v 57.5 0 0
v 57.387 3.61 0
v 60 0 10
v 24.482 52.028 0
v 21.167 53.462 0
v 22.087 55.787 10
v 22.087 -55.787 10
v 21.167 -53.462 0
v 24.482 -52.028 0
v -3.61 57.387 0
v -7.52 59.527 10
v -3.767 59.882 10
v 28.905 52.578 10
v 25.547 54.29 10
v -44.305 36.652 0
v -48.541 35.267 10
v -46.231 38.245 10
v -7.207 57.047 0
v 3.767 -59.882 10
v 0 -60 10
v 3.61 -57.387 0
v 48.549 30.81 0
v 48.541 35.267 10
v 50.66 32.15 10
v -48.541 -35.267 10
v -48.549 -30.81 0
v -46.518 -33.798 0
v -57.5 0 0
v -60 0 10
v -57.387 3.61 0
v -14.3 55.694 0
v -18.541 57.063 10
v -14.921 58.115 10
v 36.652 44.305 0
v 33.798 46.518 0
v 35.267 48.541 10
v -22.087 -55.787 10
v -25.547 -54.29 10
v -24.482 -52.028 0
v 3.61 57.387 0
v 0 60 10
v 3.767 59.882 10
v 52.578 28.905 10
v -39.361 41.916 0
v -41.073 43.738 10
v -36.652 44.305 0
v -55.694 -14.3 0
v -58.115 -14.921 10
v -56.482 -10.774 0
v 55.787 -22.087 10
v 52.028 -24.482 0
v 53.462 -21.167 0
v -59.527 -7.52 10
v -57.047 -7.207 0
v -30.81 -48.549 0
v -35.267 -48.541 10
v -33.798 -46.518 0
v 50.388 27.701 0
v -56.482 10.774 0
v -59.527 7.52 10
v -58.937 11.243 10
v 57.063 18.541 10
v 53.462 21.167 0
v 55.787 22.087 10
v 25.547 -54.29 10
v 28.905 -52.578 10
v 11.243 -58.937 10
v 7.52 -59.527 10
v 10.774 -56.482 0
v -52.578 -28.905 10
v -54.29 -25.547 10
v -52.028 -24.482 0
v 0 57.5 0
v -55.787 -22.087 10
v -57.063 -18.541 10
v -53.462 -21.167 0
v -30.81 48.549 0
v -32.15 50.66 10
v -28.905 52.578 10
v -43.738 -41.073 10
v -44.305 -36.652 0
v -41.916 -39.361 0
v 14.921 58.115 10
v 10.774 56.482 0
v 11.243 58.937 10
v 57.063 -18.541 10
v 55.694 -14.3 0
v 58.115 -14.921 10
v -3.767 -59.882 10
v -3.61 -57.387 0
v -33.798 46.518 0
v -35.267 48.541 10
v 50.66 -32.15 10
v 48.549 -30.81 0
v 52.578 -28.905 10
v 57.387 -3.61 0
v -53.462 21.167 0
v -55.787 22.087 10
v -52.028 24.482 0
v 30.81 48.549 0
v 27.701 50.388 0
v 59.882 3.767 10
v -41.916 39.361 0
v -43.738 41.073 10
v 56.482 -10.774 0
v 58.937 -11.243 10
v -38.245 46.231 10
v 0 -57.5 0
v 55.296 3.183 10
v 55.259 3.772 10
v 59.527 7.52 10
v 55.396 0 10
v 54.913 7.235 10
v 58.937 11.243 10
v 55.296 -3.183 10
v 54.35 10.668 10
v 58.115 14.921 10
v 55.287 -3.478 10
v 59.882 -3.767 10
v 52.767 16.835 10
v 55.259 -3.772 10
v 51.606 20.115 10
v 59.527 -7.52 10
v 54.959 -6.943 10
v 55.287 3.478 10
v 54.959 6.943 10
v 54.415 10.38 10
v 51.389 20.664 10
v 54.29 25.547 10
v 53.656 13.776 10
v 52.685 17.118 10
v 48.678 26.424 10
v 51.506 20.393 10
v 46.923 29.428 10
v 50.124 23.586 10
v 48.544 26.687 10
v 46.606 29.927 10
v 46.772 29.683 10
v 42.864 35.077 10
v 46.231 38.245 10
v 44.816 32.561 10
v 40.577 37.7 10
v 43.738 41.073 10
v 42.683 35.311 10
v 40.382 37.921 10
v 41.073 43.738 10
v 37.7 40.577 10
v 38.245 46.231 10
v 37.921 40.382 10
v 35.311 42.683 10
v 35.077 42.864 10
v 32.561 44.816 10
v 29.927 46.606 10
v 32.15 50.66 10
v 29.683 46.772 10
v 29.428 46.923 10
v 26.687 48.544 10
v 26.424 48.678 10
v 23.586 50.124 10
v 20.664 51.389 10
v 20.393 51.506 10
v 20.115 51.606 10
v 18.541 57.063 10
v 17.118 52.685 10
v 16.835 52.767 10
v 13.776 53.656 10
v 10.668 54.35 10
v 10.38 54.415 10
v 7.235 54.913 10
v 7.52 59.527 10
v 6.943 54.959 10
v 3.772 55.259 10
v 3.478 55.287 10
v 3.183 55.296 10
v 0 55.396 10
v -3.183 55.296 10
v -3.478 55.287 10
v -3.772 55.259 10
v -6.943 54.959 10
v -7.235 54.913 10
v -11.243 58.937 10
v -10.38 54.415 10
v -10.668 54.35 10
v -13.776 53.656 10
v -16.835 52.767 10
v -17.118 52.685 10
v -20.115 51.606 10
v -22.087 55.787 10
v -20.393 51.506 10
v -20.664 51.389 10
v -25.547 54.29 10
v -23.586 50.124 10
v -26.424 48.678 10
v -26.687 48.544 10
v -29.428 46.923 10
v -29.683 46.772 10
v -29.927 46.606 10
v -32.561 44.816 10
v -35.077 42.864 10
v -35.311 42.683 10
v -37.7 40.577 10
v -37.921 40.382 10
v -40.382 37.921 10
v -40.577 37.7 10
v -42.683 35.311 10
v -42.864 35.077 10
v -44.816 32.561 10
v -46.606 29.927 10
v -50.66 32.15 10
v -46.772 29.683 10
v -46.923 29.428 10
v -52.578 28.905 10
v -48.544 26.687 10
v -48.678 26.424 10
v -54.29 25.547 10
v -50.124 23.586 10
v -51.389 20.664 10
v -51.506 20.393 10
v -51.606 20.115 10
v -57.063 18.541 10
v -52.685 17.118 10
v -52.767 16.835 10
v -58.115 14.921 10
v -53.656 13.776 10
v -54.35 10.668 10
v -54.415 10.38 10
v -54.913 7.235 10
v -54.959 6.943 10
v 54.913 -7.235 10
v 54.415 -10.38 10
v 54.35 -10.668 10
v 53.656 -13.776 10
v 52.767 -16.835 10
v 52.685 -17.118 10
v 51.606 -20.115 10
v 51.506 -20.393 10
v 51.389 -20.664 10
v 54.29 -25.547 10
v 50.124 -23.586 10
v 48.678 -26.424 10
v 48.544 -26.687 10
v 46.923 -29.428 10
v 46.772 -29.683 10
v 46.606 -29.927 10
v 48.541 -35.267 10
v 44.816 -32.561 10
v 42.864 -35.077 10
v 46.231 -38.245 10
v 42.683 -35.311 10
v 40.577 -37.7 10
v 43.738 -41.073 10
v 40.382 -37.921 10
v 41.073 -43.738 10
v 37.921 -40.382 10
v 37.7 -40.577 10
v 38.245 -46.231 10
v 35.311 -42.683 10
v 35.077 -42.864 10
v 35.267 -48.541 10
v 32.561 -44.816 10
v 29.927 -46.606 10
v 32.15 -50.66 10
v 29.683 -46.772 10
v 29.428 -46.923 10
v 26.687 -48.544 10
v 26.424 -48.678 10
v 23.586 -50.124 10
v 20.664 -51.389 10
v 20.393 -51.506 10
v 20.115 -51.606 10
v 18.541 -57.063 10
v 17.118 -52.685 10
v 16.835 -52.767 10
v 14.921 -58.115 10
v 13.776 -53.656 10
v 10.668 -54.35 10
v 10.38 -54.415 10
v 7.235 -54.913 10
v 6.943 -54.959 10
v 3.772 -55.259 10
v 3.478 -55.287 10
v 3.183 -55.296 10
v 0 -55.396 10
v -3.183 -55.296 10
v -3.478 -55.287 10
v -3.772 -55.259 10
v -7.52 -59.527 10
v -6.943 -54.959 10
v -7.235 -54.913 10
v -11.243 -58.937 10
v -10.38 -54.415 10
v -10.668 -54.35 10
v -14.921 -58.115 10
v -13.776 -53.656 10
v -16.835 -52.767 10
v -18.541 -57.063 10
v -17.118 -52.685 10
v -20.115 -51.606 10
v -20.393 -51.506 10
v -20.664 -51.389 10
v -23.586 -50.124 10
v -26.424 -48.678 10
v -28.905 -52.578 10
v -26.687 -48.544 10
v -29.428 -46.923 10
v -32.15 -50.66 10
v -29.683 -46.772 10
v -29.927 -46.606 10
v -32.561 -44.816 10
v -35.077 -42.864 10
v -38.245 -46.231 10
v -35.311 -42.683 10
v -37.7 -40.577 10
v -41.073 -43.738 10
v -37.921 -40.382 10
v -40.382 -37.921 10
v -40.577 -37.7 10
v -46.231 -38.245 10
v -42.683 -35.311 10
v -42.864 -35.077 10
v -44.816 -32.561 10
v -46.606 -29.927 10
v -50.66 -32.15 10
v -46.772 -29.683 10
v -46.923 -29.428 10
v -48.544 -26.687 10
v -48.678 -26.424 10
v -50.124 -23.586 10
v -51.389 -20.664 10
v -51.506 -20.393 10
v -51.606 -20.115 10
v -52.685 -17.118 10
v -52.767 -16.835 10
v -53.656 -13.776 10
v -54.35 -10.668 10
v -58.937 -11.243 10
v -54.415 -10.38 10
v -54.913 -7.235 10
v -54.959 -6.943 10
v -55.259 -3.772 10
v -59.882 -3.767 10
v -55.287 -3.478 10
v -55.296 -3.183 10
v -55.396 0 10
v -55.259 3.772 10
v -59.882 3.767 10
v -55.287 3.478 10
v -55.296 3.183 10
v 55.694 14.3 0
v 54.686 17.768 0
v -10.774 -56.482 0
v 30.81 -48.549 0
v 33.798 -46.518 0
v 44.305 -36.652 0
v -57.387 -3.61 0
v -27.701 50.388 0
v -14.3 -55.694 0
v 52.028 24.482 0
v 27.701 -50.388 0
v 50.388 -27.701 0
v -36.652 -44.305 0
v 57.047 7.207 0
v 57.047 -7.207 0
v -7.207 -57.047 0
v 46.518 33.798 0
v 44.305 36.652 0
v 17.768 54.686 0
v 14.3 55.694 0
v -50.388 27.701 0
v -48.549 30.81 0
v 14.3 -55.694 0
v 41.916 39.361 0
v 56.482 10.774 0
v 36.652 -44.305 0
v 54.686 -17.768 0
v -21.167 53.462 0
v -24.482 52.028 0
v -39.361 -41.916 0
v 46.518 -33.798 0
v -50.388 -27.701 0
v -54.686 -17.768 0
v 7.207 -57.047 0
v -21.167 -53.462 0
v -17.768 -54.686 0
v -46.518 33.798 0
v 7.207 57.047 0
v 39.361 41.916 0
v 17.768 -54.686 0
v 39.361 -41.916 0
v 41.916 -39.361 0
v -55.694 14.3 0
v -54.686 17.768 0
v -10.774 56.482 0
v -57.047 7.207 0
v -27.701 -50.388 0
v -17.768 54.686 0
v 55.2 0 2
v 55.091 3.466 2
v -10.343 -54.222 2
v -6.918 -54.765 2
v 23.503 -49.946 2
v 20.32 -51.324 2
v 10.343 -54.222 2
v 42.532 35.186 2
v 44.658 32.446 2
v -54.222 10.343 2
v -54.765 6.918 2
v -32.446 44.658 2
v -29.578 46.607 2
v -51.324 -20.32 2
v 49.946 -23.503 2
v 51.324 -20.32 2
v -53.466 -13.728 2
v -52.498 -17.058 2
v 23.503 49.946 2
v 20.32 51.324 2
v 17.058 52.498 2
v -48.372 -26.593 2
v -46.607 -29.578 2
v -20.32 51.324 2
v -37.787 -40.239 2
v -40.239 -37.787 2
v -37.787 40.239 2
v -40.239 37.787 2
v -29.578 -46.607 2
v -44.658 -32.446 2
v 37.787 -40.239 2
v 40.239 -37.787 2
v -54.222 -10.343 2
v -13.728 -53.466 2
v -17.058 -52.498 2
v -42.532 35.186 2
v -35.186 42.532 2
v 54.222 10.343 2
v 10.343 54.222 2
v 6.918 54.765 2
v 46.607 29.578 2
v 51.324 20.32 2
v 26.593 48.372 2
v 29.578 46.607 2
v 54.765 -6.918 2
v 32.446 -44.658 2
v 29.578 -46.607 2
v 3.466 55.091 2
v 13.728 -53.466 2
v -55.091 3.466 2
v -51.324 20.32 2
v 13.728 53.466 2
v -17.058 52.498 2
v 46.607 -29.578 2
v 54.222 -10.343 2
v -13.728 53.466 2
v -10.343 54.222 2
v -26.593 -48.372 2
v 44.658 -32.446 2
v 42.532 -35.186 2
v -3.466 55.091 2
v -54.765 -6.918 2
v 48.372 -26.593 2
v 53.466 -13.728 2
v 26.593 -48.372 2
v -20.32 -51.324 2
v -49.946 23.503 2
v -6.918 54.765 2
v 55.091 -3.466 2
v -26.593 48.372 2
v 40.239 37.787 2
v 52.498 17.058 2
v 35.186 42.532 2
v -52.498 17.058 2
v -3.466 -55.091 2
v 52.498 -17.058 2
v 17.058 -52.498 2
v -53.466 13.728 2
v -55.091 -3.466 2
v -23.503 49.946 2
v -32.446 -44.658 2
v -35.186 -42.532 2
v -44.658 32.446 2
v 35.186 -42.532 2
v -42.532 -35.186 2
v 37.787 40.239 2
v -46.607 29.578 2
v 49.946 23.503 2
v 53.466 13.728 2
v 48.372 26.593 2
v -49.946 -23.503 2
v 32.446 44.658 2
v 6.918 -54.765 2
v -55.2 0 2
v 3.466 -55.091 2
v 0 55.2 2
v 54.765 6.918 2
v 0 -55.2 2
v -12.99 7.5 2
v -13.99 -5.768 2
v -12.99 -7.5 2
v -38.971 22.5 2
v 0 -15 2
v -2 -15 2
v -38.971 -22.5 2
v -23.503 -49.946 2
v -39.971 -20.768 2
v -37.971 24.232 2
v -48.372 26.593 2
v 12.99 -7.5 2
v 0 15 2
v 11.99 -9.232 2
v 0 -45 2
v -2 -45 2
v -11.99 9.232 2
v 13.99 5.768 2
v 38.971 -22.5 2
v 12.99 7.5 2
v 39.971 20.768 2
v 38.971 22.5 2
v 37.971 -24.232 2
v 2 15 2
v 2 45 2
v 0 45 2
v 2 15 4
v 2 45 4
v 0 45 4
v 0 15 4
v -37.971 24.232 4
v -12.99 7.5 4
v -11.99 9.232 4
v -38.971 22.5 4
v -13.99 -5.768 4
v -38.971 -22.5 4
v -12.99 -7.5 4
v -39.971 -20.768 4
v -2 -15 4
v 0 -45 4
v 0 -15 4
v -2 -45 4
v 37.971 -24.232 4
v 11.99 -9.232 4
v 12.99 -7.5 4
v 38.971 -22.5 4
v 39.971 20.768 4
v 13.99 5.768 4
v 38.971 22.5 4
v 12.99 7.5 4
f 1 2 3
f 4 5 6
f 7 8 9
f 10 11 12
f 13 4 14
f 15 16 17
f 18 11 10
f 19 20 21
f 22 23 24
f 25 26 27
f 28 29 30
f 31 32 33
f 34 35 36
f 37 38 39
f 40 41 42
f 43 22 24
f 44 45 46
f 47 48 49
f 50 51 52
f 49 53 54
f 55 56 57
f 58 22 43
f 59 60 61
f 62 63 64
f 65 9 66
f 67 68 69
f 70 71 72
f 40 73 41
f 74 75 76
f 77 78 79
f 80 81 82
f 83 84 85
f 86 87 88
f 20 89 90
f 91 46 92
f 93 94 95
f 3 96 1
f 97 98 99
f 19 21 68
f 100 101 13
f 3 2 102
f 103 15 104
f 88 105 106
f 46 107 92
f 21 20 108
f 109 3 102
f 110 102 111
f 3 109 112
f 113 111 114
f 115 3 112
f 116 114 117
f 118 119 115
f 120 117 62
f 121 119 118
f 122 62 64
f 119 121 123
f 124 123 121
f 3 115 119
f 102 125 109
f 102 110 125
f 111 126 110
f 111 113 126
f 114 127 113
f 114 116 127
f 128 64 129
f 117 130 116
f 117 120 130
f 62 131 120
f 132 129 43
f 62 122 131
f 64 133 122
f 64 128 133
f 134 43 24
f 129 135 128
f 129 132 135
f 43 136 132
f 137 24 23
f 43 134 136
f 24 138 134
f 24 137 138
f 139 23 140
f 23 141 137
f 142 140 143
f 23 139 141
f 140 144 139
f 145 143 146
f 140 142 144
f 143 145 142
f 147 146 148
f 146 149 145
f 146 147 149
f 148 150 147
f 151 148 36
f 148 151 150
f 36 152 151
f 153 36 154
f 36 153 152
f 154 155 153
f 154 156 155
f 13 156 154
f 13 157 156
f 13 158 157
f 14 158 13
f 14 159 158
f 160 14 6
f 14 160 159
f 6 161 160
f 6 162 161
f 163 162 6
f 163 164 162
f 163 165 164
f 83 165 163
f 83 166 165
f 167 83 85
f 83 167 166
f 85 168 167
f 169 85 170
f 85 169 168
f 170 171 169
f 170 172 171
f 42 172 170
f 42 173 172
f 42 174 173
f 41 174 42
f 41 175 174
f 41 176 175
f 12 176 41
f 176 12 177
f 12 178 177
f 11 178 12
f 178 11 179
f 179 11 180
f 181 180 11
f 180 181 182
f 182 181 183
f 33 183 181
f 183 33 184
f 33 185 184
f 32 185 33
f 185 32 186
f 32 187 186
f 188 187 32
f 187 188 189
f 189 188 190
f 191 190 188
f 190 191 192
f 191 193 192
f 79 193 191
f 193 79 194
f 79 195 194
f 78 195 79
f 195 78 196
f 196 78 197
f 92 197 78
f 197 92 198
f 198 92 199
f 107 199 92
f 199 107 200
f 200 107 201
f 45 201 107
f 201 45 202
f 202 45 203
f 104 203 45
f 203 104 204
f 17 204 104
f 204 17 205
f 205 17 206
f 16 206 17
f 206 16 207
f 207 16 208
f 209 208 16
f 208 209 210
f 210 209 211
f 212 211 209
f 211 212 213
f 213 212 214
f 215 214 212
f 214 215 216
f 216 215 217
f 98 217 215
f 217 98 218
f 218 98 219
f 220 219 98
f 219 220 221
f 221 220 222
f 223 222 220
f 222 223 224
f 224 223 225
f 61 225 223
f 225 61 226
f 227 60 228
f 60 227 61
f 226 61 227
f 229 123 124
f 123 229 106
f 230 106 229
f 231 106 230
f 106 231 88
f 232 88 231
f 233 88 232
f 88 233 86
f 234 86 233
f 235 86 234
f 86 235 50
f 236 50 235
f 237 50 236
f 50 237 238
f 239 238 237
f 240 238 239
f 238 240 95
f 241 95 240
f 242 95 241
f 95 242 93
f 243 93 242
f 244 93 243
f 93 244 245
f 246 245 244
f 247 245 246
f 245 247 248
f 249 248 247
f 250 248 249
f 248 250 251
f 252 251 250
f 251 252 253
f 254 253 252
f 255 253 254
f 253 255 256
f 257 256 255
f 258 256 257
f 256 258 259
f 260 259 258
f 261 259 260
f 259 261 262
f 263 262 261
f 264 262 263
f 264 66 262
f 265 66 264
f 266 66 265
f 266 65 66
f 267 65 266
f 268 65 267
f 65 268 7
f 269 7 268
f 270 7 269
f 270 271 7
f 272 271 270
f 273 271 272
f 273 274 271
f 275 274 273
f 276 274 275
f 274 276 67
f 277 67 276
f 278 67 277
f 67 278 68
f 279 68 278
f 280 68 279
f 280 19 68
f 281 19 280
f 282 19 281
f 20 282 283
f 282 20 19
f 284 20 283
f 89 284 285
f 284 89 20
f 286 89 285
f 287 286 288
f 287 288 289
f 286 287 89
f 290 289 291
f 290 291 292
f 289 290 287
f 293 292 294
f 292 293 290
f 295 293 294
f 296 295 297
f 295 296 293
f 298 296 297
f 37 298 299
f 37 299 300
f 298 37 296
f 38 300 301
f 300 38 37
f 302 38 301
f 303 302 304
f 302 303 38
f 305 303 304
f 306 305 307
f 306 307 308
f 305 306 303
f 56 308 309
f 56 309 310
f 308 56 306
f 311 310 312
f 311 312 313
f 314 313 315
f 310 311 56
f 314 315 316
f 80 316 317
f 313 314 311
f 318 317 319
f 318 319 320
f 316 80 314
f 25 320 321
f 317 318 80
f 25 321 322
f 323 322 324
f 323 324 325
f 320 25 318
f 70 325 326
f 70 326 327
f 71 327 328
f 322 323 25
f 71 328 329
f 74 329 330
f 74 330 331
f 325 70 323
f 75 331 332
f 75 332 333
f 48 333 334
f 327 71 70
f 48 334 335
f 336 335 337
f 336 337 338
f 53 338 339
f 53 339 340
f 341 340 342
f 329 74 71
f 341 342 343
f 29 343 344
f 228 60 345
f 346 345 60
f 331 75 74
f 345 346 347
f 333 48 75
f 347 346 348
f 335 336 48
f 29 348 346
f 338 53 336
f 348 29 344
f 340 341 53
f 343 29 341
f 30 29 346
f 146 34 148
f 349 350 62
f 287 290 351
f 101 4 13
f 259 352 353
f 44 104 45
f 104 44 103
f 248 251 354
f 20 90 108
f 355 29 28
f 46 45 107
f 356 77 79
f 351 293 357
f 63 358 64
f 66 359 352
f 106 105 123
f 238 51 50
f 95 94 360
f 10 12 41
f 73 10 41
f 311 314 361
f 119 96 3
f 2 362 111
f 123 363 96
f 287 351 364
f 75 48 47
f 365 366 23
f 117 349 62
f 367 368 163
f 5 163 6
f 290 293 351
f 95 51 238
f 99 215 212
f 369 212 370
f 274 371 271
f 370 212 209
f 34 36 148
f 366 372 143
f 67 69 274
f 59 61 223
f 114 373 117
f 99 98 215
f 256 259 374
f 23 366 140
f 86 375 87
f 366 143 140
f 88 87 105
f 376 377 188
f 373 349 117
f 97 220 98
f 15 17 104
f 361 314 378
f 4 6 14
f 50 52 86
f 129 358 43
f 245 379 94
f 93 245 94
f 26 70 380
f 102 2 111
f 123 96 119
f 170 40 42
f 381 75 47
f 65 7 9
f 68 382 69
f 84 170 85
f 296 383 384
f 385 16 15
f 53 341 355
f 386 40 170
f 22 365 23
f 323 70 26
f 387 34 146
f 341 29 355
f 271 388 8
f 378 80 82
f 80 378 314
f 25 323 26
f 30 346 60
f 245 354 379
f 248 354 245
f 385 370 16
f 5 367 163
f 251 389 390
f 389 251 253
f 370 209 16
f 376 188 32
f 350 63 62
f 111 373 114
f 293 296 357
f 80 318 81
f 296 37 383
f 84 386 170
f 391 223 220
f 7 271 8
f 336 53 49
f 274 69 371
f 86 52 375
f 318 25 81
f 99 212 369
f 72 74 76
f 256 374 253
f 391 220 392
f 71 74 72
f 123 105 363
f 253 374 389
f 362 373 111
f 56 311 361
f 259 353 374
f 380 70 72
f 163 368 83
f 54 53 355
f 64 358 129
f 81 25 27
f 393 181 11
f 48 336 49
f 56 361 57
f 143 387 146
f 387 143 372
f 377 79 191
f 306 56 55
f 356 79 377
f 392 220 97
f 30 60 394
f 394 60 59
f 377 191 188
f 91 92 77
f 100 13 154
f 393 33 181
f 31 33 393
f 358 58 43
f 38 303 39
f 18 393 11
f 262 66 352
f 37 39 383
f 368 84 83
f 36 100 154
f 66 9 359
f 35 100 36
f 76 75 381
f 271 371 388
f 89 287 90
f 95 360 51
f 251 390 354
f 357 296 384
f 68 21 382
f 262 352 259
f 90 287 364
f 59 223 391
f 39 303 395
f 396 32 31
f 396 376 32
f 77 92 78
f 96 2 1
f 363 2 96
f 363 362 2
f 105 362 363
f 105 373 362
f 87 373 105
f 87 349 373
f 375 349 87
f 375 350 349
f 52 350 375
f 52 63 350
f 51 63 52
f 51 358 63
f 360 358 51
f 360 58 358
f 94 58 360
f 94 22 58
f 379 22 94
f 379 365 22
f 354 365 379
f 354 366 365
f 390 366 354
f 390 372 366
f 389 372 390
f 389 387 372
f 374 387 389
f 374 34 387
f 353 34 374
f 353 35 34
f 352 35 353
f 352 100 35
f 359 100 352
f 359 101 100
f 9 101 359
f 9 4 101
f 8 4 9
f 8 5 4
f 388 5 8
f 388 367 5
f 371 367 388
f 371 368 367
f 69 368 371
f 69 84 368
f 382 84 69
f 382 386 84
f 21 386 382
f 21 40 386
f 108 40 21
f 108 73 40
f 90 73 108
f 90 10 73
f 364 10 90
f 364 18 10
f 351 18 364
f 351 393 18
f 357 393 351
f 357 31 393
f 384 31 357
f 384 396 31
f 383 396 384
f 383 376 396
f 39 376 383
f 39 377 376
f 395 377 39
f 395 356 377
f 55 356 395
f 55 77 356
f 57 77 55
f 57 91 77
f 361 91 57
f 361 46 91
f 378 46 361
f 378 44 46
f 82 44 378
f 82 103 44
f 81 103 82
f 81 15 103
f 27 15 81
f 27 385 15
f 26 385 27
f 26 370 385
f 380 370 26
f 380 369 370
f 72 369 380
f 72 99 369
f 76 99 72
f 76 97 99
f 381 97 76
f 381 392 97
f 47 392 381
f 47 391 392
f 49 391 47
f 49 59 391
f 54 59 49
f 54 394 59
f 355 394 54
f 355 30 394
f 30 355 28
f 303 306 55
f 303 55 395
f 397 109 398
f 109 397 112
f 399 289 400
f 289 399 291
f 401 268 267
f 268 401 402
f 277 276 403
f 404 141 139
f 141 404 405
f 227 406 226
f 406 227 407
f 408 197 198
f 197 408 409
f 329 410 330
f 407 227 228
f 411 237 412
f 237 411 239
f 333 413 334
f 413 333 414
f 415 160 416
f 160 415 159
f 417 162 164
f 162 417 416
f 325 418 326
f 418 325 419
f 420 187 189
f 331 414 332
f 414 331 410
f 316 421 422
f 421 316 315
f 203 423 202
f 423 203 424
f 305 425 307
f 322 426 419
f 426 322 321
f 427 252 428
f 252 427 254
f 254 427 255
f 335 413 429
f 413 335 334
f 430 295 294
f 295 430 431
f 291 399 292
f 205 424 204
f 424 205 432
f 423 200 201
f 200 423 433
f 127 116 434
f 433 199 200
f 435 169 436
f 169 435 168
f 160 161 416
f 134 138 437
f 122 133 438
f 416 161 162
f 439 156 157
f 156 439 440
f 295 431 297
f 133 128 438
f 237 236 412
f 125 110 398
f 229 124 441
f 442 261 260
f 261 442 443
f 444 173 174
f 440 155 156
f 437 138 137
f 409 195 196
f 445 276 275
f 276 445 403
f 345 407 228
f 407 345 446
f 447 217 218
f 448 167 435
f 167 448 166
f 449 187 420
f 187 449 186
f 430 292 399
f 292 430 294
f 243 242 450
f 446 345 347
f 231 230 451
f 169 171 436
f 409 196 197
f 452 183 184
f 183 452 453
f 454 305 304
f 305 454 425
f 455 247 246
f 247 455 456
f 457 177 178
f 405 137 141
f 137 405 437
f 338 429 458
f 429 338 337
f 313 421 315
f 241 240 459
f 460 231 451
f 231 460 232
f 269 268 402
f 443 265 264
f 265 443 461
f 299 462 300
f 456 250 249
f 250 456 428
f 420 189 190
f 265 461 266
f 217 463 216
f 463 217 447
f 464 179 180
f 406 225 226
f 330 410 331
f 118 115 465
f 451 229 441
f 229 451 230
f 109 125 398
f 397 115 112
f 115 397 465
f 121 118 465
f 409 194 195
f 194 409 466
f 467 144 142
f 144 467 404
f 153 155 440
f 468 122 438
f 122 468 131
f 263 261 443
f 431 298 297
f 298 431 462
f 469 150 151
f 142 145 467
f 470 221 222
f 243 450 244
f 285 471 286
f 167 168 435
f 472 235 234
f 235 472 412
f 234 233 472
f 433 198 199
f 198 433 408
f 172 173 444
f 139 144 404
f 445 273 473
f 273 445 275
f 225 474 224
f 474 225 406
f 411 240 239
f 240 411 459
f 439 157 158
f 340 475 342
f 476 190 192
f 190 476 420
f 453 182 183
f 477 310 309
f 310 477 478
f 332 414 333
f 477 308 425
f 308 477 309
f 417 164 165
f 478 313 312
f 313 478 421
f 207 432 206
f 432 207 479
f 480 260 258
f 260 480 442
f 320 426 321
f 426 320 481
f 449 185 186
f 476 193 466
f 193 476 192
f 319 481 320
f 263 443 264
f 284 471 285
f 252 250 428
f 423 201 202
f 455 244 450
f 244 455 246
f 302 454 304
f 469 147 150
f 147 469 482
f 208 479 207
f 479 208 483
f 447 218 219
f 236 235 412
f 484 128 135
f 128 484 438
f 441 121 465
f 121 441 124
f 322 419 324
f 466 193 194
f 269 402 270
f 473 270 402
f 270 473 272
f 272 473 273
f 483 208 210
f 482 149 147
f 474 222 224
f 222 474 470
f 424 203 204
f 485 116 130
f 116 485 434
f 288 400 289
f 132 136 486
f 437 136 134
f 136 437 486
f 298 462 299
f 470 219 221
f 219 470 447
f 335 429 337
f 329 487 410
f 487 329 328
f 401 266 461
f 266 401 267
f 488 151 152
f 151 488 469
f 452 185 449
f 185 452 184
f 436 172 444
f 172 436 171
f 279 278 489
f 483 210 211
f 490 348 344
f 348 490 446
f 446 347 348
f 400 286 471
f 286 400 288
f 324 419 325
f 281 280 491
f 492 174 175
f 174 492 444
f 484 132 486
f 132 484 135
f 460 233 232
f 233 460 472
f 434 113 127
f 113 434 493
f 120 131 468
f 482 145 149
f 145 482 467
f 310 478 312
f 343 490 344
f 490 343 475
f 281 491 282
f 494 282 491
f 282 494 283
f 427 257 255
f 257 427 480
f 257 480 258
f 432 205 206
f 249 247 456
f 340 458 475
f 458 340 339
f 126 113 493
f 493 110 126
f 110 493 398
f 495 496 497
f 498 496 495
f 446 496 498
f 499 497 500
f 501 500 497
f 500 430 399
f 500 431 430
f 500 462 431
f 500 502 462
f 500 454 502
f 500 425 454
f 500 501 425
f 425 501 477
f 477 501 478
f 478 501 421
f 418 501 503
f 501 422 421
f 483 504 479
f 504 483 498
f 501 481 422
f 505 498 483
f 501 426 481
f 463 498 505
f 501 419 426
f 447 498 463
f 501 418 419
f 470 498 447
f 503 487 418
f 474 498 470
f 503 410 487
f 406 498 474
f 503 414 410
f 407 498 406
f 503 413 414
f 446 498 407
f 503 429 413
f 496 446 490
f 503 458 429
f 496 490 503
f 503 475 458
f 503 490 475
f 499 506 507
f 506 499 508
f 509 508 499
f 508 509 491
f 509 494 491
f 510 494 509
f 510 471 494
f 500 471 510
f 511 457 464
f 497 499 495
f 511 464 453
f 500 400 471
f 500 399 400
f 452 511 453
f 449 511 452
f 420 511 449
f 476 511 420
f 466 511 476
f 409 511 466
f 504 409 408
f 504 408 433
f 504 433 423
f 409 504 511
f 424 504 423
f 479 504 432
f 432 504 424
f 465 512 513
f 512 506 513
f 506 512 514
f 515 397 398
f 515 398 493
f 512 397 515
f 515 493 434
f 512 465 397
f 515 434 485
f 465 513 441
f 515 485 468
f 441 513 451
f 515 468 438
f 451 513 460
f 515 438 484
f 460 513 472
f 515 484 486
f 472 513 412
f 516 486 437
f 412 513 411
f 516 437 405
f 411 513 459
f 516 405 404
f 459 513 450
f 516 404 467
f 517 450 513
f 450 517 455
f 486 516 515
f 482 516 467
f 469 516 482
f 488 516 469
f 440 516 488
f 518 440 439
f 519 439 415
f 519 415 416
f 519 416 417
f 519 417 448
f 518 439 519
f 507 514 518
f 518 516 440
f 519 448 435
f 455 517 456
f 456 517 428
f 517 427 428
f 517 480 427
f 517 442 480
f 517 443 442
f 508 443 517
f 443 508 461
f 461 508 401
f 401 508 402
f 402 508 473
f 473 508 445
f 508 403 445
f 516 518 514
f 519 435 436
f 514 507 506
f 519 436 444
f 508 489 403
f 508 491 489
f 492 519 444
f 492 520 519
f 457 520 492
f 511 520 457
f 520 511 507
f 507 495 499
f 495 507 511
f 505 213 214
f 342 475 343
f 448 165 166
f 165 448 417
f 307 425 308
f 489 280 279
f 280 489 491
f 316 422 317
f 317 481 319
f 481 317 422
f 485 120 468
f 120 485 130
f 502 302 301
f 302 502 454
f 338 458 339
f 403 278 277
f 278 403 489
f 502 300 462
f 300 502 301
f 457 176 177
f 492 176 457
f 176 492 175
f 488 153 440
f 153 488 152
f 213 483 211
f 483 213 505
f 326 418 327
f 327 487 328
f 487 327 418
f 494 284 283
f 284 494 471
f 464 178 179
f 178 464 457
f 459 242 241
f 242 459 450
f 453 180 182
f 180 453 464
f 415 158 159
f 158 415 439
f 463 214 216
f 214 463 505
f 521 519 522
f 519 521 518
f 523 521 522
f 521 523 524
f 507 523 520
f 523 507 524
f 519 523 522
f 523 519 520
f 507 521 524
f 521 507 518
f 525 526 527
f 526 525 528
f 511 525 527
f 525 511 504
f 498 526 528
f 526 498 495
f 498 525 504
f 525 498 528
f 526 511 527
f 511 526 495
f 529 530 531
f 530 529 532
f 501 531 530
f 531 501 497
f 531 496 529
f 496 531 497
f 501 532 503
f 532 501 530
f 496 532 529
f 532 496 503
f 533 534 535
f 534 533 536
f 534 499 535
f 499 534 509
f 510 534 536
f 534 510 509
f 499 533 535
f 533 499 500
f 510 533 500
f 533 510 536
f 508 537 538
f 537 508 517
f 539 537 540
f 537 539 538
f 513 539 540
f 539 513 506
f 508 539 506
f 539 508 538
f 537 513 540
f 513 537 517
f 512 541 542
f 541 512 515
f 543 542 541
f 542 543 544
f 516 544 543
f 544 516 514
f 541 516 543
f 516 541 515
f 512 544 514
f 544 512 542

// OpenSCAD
// variables
size = 100; // [50:S,100:M,150:L]
wallthickness = 2; // [1:S,2:M,3:L]
resolution = 100; // [100:rough,150:middle,200:fine]

// model coaster
union(){
	difference(){
		translate([0,0,0])cylinder(h = size*.1, r1 = size*1.15/2, r2 = size*1.2/2, $fn = resolution);
		translate([0,0,wallthickness])cylinder(h = size-wallthickness, r1 = (size-2*wallthickness)*1.15/2, r2 = (size-2*wallthickness)*1.2/2, $fn = resolution);
	}
	union(){
		rotate([0,0,0]) translate([0,15,wallthickness]) cube([wallthickness,size*0.30,wallthickness]);
		rotate([0,0,60]) translate([0,15,wallthickness]) cube([wallthickness,size*0.30,wallthickness]);
		rotate([0,0,120]) translate([0,15,wallthickness]) cube([wallthickness,size*0.30,wallthickness]);
		rotate([0,0,180]) translate([0,15,wallthickness]) cube([wallthickness,size*0.30,wallthickness]);
		rotate([0,0,240]) translate([0,15,wallthickness]) cube([wallthickness,size*0.30,wallthickness]);
		rotate([0,0,300]) translate([0,15,wallthickness]) cube([wallthickness,size*0.30,wallthickness]);
	}
}
